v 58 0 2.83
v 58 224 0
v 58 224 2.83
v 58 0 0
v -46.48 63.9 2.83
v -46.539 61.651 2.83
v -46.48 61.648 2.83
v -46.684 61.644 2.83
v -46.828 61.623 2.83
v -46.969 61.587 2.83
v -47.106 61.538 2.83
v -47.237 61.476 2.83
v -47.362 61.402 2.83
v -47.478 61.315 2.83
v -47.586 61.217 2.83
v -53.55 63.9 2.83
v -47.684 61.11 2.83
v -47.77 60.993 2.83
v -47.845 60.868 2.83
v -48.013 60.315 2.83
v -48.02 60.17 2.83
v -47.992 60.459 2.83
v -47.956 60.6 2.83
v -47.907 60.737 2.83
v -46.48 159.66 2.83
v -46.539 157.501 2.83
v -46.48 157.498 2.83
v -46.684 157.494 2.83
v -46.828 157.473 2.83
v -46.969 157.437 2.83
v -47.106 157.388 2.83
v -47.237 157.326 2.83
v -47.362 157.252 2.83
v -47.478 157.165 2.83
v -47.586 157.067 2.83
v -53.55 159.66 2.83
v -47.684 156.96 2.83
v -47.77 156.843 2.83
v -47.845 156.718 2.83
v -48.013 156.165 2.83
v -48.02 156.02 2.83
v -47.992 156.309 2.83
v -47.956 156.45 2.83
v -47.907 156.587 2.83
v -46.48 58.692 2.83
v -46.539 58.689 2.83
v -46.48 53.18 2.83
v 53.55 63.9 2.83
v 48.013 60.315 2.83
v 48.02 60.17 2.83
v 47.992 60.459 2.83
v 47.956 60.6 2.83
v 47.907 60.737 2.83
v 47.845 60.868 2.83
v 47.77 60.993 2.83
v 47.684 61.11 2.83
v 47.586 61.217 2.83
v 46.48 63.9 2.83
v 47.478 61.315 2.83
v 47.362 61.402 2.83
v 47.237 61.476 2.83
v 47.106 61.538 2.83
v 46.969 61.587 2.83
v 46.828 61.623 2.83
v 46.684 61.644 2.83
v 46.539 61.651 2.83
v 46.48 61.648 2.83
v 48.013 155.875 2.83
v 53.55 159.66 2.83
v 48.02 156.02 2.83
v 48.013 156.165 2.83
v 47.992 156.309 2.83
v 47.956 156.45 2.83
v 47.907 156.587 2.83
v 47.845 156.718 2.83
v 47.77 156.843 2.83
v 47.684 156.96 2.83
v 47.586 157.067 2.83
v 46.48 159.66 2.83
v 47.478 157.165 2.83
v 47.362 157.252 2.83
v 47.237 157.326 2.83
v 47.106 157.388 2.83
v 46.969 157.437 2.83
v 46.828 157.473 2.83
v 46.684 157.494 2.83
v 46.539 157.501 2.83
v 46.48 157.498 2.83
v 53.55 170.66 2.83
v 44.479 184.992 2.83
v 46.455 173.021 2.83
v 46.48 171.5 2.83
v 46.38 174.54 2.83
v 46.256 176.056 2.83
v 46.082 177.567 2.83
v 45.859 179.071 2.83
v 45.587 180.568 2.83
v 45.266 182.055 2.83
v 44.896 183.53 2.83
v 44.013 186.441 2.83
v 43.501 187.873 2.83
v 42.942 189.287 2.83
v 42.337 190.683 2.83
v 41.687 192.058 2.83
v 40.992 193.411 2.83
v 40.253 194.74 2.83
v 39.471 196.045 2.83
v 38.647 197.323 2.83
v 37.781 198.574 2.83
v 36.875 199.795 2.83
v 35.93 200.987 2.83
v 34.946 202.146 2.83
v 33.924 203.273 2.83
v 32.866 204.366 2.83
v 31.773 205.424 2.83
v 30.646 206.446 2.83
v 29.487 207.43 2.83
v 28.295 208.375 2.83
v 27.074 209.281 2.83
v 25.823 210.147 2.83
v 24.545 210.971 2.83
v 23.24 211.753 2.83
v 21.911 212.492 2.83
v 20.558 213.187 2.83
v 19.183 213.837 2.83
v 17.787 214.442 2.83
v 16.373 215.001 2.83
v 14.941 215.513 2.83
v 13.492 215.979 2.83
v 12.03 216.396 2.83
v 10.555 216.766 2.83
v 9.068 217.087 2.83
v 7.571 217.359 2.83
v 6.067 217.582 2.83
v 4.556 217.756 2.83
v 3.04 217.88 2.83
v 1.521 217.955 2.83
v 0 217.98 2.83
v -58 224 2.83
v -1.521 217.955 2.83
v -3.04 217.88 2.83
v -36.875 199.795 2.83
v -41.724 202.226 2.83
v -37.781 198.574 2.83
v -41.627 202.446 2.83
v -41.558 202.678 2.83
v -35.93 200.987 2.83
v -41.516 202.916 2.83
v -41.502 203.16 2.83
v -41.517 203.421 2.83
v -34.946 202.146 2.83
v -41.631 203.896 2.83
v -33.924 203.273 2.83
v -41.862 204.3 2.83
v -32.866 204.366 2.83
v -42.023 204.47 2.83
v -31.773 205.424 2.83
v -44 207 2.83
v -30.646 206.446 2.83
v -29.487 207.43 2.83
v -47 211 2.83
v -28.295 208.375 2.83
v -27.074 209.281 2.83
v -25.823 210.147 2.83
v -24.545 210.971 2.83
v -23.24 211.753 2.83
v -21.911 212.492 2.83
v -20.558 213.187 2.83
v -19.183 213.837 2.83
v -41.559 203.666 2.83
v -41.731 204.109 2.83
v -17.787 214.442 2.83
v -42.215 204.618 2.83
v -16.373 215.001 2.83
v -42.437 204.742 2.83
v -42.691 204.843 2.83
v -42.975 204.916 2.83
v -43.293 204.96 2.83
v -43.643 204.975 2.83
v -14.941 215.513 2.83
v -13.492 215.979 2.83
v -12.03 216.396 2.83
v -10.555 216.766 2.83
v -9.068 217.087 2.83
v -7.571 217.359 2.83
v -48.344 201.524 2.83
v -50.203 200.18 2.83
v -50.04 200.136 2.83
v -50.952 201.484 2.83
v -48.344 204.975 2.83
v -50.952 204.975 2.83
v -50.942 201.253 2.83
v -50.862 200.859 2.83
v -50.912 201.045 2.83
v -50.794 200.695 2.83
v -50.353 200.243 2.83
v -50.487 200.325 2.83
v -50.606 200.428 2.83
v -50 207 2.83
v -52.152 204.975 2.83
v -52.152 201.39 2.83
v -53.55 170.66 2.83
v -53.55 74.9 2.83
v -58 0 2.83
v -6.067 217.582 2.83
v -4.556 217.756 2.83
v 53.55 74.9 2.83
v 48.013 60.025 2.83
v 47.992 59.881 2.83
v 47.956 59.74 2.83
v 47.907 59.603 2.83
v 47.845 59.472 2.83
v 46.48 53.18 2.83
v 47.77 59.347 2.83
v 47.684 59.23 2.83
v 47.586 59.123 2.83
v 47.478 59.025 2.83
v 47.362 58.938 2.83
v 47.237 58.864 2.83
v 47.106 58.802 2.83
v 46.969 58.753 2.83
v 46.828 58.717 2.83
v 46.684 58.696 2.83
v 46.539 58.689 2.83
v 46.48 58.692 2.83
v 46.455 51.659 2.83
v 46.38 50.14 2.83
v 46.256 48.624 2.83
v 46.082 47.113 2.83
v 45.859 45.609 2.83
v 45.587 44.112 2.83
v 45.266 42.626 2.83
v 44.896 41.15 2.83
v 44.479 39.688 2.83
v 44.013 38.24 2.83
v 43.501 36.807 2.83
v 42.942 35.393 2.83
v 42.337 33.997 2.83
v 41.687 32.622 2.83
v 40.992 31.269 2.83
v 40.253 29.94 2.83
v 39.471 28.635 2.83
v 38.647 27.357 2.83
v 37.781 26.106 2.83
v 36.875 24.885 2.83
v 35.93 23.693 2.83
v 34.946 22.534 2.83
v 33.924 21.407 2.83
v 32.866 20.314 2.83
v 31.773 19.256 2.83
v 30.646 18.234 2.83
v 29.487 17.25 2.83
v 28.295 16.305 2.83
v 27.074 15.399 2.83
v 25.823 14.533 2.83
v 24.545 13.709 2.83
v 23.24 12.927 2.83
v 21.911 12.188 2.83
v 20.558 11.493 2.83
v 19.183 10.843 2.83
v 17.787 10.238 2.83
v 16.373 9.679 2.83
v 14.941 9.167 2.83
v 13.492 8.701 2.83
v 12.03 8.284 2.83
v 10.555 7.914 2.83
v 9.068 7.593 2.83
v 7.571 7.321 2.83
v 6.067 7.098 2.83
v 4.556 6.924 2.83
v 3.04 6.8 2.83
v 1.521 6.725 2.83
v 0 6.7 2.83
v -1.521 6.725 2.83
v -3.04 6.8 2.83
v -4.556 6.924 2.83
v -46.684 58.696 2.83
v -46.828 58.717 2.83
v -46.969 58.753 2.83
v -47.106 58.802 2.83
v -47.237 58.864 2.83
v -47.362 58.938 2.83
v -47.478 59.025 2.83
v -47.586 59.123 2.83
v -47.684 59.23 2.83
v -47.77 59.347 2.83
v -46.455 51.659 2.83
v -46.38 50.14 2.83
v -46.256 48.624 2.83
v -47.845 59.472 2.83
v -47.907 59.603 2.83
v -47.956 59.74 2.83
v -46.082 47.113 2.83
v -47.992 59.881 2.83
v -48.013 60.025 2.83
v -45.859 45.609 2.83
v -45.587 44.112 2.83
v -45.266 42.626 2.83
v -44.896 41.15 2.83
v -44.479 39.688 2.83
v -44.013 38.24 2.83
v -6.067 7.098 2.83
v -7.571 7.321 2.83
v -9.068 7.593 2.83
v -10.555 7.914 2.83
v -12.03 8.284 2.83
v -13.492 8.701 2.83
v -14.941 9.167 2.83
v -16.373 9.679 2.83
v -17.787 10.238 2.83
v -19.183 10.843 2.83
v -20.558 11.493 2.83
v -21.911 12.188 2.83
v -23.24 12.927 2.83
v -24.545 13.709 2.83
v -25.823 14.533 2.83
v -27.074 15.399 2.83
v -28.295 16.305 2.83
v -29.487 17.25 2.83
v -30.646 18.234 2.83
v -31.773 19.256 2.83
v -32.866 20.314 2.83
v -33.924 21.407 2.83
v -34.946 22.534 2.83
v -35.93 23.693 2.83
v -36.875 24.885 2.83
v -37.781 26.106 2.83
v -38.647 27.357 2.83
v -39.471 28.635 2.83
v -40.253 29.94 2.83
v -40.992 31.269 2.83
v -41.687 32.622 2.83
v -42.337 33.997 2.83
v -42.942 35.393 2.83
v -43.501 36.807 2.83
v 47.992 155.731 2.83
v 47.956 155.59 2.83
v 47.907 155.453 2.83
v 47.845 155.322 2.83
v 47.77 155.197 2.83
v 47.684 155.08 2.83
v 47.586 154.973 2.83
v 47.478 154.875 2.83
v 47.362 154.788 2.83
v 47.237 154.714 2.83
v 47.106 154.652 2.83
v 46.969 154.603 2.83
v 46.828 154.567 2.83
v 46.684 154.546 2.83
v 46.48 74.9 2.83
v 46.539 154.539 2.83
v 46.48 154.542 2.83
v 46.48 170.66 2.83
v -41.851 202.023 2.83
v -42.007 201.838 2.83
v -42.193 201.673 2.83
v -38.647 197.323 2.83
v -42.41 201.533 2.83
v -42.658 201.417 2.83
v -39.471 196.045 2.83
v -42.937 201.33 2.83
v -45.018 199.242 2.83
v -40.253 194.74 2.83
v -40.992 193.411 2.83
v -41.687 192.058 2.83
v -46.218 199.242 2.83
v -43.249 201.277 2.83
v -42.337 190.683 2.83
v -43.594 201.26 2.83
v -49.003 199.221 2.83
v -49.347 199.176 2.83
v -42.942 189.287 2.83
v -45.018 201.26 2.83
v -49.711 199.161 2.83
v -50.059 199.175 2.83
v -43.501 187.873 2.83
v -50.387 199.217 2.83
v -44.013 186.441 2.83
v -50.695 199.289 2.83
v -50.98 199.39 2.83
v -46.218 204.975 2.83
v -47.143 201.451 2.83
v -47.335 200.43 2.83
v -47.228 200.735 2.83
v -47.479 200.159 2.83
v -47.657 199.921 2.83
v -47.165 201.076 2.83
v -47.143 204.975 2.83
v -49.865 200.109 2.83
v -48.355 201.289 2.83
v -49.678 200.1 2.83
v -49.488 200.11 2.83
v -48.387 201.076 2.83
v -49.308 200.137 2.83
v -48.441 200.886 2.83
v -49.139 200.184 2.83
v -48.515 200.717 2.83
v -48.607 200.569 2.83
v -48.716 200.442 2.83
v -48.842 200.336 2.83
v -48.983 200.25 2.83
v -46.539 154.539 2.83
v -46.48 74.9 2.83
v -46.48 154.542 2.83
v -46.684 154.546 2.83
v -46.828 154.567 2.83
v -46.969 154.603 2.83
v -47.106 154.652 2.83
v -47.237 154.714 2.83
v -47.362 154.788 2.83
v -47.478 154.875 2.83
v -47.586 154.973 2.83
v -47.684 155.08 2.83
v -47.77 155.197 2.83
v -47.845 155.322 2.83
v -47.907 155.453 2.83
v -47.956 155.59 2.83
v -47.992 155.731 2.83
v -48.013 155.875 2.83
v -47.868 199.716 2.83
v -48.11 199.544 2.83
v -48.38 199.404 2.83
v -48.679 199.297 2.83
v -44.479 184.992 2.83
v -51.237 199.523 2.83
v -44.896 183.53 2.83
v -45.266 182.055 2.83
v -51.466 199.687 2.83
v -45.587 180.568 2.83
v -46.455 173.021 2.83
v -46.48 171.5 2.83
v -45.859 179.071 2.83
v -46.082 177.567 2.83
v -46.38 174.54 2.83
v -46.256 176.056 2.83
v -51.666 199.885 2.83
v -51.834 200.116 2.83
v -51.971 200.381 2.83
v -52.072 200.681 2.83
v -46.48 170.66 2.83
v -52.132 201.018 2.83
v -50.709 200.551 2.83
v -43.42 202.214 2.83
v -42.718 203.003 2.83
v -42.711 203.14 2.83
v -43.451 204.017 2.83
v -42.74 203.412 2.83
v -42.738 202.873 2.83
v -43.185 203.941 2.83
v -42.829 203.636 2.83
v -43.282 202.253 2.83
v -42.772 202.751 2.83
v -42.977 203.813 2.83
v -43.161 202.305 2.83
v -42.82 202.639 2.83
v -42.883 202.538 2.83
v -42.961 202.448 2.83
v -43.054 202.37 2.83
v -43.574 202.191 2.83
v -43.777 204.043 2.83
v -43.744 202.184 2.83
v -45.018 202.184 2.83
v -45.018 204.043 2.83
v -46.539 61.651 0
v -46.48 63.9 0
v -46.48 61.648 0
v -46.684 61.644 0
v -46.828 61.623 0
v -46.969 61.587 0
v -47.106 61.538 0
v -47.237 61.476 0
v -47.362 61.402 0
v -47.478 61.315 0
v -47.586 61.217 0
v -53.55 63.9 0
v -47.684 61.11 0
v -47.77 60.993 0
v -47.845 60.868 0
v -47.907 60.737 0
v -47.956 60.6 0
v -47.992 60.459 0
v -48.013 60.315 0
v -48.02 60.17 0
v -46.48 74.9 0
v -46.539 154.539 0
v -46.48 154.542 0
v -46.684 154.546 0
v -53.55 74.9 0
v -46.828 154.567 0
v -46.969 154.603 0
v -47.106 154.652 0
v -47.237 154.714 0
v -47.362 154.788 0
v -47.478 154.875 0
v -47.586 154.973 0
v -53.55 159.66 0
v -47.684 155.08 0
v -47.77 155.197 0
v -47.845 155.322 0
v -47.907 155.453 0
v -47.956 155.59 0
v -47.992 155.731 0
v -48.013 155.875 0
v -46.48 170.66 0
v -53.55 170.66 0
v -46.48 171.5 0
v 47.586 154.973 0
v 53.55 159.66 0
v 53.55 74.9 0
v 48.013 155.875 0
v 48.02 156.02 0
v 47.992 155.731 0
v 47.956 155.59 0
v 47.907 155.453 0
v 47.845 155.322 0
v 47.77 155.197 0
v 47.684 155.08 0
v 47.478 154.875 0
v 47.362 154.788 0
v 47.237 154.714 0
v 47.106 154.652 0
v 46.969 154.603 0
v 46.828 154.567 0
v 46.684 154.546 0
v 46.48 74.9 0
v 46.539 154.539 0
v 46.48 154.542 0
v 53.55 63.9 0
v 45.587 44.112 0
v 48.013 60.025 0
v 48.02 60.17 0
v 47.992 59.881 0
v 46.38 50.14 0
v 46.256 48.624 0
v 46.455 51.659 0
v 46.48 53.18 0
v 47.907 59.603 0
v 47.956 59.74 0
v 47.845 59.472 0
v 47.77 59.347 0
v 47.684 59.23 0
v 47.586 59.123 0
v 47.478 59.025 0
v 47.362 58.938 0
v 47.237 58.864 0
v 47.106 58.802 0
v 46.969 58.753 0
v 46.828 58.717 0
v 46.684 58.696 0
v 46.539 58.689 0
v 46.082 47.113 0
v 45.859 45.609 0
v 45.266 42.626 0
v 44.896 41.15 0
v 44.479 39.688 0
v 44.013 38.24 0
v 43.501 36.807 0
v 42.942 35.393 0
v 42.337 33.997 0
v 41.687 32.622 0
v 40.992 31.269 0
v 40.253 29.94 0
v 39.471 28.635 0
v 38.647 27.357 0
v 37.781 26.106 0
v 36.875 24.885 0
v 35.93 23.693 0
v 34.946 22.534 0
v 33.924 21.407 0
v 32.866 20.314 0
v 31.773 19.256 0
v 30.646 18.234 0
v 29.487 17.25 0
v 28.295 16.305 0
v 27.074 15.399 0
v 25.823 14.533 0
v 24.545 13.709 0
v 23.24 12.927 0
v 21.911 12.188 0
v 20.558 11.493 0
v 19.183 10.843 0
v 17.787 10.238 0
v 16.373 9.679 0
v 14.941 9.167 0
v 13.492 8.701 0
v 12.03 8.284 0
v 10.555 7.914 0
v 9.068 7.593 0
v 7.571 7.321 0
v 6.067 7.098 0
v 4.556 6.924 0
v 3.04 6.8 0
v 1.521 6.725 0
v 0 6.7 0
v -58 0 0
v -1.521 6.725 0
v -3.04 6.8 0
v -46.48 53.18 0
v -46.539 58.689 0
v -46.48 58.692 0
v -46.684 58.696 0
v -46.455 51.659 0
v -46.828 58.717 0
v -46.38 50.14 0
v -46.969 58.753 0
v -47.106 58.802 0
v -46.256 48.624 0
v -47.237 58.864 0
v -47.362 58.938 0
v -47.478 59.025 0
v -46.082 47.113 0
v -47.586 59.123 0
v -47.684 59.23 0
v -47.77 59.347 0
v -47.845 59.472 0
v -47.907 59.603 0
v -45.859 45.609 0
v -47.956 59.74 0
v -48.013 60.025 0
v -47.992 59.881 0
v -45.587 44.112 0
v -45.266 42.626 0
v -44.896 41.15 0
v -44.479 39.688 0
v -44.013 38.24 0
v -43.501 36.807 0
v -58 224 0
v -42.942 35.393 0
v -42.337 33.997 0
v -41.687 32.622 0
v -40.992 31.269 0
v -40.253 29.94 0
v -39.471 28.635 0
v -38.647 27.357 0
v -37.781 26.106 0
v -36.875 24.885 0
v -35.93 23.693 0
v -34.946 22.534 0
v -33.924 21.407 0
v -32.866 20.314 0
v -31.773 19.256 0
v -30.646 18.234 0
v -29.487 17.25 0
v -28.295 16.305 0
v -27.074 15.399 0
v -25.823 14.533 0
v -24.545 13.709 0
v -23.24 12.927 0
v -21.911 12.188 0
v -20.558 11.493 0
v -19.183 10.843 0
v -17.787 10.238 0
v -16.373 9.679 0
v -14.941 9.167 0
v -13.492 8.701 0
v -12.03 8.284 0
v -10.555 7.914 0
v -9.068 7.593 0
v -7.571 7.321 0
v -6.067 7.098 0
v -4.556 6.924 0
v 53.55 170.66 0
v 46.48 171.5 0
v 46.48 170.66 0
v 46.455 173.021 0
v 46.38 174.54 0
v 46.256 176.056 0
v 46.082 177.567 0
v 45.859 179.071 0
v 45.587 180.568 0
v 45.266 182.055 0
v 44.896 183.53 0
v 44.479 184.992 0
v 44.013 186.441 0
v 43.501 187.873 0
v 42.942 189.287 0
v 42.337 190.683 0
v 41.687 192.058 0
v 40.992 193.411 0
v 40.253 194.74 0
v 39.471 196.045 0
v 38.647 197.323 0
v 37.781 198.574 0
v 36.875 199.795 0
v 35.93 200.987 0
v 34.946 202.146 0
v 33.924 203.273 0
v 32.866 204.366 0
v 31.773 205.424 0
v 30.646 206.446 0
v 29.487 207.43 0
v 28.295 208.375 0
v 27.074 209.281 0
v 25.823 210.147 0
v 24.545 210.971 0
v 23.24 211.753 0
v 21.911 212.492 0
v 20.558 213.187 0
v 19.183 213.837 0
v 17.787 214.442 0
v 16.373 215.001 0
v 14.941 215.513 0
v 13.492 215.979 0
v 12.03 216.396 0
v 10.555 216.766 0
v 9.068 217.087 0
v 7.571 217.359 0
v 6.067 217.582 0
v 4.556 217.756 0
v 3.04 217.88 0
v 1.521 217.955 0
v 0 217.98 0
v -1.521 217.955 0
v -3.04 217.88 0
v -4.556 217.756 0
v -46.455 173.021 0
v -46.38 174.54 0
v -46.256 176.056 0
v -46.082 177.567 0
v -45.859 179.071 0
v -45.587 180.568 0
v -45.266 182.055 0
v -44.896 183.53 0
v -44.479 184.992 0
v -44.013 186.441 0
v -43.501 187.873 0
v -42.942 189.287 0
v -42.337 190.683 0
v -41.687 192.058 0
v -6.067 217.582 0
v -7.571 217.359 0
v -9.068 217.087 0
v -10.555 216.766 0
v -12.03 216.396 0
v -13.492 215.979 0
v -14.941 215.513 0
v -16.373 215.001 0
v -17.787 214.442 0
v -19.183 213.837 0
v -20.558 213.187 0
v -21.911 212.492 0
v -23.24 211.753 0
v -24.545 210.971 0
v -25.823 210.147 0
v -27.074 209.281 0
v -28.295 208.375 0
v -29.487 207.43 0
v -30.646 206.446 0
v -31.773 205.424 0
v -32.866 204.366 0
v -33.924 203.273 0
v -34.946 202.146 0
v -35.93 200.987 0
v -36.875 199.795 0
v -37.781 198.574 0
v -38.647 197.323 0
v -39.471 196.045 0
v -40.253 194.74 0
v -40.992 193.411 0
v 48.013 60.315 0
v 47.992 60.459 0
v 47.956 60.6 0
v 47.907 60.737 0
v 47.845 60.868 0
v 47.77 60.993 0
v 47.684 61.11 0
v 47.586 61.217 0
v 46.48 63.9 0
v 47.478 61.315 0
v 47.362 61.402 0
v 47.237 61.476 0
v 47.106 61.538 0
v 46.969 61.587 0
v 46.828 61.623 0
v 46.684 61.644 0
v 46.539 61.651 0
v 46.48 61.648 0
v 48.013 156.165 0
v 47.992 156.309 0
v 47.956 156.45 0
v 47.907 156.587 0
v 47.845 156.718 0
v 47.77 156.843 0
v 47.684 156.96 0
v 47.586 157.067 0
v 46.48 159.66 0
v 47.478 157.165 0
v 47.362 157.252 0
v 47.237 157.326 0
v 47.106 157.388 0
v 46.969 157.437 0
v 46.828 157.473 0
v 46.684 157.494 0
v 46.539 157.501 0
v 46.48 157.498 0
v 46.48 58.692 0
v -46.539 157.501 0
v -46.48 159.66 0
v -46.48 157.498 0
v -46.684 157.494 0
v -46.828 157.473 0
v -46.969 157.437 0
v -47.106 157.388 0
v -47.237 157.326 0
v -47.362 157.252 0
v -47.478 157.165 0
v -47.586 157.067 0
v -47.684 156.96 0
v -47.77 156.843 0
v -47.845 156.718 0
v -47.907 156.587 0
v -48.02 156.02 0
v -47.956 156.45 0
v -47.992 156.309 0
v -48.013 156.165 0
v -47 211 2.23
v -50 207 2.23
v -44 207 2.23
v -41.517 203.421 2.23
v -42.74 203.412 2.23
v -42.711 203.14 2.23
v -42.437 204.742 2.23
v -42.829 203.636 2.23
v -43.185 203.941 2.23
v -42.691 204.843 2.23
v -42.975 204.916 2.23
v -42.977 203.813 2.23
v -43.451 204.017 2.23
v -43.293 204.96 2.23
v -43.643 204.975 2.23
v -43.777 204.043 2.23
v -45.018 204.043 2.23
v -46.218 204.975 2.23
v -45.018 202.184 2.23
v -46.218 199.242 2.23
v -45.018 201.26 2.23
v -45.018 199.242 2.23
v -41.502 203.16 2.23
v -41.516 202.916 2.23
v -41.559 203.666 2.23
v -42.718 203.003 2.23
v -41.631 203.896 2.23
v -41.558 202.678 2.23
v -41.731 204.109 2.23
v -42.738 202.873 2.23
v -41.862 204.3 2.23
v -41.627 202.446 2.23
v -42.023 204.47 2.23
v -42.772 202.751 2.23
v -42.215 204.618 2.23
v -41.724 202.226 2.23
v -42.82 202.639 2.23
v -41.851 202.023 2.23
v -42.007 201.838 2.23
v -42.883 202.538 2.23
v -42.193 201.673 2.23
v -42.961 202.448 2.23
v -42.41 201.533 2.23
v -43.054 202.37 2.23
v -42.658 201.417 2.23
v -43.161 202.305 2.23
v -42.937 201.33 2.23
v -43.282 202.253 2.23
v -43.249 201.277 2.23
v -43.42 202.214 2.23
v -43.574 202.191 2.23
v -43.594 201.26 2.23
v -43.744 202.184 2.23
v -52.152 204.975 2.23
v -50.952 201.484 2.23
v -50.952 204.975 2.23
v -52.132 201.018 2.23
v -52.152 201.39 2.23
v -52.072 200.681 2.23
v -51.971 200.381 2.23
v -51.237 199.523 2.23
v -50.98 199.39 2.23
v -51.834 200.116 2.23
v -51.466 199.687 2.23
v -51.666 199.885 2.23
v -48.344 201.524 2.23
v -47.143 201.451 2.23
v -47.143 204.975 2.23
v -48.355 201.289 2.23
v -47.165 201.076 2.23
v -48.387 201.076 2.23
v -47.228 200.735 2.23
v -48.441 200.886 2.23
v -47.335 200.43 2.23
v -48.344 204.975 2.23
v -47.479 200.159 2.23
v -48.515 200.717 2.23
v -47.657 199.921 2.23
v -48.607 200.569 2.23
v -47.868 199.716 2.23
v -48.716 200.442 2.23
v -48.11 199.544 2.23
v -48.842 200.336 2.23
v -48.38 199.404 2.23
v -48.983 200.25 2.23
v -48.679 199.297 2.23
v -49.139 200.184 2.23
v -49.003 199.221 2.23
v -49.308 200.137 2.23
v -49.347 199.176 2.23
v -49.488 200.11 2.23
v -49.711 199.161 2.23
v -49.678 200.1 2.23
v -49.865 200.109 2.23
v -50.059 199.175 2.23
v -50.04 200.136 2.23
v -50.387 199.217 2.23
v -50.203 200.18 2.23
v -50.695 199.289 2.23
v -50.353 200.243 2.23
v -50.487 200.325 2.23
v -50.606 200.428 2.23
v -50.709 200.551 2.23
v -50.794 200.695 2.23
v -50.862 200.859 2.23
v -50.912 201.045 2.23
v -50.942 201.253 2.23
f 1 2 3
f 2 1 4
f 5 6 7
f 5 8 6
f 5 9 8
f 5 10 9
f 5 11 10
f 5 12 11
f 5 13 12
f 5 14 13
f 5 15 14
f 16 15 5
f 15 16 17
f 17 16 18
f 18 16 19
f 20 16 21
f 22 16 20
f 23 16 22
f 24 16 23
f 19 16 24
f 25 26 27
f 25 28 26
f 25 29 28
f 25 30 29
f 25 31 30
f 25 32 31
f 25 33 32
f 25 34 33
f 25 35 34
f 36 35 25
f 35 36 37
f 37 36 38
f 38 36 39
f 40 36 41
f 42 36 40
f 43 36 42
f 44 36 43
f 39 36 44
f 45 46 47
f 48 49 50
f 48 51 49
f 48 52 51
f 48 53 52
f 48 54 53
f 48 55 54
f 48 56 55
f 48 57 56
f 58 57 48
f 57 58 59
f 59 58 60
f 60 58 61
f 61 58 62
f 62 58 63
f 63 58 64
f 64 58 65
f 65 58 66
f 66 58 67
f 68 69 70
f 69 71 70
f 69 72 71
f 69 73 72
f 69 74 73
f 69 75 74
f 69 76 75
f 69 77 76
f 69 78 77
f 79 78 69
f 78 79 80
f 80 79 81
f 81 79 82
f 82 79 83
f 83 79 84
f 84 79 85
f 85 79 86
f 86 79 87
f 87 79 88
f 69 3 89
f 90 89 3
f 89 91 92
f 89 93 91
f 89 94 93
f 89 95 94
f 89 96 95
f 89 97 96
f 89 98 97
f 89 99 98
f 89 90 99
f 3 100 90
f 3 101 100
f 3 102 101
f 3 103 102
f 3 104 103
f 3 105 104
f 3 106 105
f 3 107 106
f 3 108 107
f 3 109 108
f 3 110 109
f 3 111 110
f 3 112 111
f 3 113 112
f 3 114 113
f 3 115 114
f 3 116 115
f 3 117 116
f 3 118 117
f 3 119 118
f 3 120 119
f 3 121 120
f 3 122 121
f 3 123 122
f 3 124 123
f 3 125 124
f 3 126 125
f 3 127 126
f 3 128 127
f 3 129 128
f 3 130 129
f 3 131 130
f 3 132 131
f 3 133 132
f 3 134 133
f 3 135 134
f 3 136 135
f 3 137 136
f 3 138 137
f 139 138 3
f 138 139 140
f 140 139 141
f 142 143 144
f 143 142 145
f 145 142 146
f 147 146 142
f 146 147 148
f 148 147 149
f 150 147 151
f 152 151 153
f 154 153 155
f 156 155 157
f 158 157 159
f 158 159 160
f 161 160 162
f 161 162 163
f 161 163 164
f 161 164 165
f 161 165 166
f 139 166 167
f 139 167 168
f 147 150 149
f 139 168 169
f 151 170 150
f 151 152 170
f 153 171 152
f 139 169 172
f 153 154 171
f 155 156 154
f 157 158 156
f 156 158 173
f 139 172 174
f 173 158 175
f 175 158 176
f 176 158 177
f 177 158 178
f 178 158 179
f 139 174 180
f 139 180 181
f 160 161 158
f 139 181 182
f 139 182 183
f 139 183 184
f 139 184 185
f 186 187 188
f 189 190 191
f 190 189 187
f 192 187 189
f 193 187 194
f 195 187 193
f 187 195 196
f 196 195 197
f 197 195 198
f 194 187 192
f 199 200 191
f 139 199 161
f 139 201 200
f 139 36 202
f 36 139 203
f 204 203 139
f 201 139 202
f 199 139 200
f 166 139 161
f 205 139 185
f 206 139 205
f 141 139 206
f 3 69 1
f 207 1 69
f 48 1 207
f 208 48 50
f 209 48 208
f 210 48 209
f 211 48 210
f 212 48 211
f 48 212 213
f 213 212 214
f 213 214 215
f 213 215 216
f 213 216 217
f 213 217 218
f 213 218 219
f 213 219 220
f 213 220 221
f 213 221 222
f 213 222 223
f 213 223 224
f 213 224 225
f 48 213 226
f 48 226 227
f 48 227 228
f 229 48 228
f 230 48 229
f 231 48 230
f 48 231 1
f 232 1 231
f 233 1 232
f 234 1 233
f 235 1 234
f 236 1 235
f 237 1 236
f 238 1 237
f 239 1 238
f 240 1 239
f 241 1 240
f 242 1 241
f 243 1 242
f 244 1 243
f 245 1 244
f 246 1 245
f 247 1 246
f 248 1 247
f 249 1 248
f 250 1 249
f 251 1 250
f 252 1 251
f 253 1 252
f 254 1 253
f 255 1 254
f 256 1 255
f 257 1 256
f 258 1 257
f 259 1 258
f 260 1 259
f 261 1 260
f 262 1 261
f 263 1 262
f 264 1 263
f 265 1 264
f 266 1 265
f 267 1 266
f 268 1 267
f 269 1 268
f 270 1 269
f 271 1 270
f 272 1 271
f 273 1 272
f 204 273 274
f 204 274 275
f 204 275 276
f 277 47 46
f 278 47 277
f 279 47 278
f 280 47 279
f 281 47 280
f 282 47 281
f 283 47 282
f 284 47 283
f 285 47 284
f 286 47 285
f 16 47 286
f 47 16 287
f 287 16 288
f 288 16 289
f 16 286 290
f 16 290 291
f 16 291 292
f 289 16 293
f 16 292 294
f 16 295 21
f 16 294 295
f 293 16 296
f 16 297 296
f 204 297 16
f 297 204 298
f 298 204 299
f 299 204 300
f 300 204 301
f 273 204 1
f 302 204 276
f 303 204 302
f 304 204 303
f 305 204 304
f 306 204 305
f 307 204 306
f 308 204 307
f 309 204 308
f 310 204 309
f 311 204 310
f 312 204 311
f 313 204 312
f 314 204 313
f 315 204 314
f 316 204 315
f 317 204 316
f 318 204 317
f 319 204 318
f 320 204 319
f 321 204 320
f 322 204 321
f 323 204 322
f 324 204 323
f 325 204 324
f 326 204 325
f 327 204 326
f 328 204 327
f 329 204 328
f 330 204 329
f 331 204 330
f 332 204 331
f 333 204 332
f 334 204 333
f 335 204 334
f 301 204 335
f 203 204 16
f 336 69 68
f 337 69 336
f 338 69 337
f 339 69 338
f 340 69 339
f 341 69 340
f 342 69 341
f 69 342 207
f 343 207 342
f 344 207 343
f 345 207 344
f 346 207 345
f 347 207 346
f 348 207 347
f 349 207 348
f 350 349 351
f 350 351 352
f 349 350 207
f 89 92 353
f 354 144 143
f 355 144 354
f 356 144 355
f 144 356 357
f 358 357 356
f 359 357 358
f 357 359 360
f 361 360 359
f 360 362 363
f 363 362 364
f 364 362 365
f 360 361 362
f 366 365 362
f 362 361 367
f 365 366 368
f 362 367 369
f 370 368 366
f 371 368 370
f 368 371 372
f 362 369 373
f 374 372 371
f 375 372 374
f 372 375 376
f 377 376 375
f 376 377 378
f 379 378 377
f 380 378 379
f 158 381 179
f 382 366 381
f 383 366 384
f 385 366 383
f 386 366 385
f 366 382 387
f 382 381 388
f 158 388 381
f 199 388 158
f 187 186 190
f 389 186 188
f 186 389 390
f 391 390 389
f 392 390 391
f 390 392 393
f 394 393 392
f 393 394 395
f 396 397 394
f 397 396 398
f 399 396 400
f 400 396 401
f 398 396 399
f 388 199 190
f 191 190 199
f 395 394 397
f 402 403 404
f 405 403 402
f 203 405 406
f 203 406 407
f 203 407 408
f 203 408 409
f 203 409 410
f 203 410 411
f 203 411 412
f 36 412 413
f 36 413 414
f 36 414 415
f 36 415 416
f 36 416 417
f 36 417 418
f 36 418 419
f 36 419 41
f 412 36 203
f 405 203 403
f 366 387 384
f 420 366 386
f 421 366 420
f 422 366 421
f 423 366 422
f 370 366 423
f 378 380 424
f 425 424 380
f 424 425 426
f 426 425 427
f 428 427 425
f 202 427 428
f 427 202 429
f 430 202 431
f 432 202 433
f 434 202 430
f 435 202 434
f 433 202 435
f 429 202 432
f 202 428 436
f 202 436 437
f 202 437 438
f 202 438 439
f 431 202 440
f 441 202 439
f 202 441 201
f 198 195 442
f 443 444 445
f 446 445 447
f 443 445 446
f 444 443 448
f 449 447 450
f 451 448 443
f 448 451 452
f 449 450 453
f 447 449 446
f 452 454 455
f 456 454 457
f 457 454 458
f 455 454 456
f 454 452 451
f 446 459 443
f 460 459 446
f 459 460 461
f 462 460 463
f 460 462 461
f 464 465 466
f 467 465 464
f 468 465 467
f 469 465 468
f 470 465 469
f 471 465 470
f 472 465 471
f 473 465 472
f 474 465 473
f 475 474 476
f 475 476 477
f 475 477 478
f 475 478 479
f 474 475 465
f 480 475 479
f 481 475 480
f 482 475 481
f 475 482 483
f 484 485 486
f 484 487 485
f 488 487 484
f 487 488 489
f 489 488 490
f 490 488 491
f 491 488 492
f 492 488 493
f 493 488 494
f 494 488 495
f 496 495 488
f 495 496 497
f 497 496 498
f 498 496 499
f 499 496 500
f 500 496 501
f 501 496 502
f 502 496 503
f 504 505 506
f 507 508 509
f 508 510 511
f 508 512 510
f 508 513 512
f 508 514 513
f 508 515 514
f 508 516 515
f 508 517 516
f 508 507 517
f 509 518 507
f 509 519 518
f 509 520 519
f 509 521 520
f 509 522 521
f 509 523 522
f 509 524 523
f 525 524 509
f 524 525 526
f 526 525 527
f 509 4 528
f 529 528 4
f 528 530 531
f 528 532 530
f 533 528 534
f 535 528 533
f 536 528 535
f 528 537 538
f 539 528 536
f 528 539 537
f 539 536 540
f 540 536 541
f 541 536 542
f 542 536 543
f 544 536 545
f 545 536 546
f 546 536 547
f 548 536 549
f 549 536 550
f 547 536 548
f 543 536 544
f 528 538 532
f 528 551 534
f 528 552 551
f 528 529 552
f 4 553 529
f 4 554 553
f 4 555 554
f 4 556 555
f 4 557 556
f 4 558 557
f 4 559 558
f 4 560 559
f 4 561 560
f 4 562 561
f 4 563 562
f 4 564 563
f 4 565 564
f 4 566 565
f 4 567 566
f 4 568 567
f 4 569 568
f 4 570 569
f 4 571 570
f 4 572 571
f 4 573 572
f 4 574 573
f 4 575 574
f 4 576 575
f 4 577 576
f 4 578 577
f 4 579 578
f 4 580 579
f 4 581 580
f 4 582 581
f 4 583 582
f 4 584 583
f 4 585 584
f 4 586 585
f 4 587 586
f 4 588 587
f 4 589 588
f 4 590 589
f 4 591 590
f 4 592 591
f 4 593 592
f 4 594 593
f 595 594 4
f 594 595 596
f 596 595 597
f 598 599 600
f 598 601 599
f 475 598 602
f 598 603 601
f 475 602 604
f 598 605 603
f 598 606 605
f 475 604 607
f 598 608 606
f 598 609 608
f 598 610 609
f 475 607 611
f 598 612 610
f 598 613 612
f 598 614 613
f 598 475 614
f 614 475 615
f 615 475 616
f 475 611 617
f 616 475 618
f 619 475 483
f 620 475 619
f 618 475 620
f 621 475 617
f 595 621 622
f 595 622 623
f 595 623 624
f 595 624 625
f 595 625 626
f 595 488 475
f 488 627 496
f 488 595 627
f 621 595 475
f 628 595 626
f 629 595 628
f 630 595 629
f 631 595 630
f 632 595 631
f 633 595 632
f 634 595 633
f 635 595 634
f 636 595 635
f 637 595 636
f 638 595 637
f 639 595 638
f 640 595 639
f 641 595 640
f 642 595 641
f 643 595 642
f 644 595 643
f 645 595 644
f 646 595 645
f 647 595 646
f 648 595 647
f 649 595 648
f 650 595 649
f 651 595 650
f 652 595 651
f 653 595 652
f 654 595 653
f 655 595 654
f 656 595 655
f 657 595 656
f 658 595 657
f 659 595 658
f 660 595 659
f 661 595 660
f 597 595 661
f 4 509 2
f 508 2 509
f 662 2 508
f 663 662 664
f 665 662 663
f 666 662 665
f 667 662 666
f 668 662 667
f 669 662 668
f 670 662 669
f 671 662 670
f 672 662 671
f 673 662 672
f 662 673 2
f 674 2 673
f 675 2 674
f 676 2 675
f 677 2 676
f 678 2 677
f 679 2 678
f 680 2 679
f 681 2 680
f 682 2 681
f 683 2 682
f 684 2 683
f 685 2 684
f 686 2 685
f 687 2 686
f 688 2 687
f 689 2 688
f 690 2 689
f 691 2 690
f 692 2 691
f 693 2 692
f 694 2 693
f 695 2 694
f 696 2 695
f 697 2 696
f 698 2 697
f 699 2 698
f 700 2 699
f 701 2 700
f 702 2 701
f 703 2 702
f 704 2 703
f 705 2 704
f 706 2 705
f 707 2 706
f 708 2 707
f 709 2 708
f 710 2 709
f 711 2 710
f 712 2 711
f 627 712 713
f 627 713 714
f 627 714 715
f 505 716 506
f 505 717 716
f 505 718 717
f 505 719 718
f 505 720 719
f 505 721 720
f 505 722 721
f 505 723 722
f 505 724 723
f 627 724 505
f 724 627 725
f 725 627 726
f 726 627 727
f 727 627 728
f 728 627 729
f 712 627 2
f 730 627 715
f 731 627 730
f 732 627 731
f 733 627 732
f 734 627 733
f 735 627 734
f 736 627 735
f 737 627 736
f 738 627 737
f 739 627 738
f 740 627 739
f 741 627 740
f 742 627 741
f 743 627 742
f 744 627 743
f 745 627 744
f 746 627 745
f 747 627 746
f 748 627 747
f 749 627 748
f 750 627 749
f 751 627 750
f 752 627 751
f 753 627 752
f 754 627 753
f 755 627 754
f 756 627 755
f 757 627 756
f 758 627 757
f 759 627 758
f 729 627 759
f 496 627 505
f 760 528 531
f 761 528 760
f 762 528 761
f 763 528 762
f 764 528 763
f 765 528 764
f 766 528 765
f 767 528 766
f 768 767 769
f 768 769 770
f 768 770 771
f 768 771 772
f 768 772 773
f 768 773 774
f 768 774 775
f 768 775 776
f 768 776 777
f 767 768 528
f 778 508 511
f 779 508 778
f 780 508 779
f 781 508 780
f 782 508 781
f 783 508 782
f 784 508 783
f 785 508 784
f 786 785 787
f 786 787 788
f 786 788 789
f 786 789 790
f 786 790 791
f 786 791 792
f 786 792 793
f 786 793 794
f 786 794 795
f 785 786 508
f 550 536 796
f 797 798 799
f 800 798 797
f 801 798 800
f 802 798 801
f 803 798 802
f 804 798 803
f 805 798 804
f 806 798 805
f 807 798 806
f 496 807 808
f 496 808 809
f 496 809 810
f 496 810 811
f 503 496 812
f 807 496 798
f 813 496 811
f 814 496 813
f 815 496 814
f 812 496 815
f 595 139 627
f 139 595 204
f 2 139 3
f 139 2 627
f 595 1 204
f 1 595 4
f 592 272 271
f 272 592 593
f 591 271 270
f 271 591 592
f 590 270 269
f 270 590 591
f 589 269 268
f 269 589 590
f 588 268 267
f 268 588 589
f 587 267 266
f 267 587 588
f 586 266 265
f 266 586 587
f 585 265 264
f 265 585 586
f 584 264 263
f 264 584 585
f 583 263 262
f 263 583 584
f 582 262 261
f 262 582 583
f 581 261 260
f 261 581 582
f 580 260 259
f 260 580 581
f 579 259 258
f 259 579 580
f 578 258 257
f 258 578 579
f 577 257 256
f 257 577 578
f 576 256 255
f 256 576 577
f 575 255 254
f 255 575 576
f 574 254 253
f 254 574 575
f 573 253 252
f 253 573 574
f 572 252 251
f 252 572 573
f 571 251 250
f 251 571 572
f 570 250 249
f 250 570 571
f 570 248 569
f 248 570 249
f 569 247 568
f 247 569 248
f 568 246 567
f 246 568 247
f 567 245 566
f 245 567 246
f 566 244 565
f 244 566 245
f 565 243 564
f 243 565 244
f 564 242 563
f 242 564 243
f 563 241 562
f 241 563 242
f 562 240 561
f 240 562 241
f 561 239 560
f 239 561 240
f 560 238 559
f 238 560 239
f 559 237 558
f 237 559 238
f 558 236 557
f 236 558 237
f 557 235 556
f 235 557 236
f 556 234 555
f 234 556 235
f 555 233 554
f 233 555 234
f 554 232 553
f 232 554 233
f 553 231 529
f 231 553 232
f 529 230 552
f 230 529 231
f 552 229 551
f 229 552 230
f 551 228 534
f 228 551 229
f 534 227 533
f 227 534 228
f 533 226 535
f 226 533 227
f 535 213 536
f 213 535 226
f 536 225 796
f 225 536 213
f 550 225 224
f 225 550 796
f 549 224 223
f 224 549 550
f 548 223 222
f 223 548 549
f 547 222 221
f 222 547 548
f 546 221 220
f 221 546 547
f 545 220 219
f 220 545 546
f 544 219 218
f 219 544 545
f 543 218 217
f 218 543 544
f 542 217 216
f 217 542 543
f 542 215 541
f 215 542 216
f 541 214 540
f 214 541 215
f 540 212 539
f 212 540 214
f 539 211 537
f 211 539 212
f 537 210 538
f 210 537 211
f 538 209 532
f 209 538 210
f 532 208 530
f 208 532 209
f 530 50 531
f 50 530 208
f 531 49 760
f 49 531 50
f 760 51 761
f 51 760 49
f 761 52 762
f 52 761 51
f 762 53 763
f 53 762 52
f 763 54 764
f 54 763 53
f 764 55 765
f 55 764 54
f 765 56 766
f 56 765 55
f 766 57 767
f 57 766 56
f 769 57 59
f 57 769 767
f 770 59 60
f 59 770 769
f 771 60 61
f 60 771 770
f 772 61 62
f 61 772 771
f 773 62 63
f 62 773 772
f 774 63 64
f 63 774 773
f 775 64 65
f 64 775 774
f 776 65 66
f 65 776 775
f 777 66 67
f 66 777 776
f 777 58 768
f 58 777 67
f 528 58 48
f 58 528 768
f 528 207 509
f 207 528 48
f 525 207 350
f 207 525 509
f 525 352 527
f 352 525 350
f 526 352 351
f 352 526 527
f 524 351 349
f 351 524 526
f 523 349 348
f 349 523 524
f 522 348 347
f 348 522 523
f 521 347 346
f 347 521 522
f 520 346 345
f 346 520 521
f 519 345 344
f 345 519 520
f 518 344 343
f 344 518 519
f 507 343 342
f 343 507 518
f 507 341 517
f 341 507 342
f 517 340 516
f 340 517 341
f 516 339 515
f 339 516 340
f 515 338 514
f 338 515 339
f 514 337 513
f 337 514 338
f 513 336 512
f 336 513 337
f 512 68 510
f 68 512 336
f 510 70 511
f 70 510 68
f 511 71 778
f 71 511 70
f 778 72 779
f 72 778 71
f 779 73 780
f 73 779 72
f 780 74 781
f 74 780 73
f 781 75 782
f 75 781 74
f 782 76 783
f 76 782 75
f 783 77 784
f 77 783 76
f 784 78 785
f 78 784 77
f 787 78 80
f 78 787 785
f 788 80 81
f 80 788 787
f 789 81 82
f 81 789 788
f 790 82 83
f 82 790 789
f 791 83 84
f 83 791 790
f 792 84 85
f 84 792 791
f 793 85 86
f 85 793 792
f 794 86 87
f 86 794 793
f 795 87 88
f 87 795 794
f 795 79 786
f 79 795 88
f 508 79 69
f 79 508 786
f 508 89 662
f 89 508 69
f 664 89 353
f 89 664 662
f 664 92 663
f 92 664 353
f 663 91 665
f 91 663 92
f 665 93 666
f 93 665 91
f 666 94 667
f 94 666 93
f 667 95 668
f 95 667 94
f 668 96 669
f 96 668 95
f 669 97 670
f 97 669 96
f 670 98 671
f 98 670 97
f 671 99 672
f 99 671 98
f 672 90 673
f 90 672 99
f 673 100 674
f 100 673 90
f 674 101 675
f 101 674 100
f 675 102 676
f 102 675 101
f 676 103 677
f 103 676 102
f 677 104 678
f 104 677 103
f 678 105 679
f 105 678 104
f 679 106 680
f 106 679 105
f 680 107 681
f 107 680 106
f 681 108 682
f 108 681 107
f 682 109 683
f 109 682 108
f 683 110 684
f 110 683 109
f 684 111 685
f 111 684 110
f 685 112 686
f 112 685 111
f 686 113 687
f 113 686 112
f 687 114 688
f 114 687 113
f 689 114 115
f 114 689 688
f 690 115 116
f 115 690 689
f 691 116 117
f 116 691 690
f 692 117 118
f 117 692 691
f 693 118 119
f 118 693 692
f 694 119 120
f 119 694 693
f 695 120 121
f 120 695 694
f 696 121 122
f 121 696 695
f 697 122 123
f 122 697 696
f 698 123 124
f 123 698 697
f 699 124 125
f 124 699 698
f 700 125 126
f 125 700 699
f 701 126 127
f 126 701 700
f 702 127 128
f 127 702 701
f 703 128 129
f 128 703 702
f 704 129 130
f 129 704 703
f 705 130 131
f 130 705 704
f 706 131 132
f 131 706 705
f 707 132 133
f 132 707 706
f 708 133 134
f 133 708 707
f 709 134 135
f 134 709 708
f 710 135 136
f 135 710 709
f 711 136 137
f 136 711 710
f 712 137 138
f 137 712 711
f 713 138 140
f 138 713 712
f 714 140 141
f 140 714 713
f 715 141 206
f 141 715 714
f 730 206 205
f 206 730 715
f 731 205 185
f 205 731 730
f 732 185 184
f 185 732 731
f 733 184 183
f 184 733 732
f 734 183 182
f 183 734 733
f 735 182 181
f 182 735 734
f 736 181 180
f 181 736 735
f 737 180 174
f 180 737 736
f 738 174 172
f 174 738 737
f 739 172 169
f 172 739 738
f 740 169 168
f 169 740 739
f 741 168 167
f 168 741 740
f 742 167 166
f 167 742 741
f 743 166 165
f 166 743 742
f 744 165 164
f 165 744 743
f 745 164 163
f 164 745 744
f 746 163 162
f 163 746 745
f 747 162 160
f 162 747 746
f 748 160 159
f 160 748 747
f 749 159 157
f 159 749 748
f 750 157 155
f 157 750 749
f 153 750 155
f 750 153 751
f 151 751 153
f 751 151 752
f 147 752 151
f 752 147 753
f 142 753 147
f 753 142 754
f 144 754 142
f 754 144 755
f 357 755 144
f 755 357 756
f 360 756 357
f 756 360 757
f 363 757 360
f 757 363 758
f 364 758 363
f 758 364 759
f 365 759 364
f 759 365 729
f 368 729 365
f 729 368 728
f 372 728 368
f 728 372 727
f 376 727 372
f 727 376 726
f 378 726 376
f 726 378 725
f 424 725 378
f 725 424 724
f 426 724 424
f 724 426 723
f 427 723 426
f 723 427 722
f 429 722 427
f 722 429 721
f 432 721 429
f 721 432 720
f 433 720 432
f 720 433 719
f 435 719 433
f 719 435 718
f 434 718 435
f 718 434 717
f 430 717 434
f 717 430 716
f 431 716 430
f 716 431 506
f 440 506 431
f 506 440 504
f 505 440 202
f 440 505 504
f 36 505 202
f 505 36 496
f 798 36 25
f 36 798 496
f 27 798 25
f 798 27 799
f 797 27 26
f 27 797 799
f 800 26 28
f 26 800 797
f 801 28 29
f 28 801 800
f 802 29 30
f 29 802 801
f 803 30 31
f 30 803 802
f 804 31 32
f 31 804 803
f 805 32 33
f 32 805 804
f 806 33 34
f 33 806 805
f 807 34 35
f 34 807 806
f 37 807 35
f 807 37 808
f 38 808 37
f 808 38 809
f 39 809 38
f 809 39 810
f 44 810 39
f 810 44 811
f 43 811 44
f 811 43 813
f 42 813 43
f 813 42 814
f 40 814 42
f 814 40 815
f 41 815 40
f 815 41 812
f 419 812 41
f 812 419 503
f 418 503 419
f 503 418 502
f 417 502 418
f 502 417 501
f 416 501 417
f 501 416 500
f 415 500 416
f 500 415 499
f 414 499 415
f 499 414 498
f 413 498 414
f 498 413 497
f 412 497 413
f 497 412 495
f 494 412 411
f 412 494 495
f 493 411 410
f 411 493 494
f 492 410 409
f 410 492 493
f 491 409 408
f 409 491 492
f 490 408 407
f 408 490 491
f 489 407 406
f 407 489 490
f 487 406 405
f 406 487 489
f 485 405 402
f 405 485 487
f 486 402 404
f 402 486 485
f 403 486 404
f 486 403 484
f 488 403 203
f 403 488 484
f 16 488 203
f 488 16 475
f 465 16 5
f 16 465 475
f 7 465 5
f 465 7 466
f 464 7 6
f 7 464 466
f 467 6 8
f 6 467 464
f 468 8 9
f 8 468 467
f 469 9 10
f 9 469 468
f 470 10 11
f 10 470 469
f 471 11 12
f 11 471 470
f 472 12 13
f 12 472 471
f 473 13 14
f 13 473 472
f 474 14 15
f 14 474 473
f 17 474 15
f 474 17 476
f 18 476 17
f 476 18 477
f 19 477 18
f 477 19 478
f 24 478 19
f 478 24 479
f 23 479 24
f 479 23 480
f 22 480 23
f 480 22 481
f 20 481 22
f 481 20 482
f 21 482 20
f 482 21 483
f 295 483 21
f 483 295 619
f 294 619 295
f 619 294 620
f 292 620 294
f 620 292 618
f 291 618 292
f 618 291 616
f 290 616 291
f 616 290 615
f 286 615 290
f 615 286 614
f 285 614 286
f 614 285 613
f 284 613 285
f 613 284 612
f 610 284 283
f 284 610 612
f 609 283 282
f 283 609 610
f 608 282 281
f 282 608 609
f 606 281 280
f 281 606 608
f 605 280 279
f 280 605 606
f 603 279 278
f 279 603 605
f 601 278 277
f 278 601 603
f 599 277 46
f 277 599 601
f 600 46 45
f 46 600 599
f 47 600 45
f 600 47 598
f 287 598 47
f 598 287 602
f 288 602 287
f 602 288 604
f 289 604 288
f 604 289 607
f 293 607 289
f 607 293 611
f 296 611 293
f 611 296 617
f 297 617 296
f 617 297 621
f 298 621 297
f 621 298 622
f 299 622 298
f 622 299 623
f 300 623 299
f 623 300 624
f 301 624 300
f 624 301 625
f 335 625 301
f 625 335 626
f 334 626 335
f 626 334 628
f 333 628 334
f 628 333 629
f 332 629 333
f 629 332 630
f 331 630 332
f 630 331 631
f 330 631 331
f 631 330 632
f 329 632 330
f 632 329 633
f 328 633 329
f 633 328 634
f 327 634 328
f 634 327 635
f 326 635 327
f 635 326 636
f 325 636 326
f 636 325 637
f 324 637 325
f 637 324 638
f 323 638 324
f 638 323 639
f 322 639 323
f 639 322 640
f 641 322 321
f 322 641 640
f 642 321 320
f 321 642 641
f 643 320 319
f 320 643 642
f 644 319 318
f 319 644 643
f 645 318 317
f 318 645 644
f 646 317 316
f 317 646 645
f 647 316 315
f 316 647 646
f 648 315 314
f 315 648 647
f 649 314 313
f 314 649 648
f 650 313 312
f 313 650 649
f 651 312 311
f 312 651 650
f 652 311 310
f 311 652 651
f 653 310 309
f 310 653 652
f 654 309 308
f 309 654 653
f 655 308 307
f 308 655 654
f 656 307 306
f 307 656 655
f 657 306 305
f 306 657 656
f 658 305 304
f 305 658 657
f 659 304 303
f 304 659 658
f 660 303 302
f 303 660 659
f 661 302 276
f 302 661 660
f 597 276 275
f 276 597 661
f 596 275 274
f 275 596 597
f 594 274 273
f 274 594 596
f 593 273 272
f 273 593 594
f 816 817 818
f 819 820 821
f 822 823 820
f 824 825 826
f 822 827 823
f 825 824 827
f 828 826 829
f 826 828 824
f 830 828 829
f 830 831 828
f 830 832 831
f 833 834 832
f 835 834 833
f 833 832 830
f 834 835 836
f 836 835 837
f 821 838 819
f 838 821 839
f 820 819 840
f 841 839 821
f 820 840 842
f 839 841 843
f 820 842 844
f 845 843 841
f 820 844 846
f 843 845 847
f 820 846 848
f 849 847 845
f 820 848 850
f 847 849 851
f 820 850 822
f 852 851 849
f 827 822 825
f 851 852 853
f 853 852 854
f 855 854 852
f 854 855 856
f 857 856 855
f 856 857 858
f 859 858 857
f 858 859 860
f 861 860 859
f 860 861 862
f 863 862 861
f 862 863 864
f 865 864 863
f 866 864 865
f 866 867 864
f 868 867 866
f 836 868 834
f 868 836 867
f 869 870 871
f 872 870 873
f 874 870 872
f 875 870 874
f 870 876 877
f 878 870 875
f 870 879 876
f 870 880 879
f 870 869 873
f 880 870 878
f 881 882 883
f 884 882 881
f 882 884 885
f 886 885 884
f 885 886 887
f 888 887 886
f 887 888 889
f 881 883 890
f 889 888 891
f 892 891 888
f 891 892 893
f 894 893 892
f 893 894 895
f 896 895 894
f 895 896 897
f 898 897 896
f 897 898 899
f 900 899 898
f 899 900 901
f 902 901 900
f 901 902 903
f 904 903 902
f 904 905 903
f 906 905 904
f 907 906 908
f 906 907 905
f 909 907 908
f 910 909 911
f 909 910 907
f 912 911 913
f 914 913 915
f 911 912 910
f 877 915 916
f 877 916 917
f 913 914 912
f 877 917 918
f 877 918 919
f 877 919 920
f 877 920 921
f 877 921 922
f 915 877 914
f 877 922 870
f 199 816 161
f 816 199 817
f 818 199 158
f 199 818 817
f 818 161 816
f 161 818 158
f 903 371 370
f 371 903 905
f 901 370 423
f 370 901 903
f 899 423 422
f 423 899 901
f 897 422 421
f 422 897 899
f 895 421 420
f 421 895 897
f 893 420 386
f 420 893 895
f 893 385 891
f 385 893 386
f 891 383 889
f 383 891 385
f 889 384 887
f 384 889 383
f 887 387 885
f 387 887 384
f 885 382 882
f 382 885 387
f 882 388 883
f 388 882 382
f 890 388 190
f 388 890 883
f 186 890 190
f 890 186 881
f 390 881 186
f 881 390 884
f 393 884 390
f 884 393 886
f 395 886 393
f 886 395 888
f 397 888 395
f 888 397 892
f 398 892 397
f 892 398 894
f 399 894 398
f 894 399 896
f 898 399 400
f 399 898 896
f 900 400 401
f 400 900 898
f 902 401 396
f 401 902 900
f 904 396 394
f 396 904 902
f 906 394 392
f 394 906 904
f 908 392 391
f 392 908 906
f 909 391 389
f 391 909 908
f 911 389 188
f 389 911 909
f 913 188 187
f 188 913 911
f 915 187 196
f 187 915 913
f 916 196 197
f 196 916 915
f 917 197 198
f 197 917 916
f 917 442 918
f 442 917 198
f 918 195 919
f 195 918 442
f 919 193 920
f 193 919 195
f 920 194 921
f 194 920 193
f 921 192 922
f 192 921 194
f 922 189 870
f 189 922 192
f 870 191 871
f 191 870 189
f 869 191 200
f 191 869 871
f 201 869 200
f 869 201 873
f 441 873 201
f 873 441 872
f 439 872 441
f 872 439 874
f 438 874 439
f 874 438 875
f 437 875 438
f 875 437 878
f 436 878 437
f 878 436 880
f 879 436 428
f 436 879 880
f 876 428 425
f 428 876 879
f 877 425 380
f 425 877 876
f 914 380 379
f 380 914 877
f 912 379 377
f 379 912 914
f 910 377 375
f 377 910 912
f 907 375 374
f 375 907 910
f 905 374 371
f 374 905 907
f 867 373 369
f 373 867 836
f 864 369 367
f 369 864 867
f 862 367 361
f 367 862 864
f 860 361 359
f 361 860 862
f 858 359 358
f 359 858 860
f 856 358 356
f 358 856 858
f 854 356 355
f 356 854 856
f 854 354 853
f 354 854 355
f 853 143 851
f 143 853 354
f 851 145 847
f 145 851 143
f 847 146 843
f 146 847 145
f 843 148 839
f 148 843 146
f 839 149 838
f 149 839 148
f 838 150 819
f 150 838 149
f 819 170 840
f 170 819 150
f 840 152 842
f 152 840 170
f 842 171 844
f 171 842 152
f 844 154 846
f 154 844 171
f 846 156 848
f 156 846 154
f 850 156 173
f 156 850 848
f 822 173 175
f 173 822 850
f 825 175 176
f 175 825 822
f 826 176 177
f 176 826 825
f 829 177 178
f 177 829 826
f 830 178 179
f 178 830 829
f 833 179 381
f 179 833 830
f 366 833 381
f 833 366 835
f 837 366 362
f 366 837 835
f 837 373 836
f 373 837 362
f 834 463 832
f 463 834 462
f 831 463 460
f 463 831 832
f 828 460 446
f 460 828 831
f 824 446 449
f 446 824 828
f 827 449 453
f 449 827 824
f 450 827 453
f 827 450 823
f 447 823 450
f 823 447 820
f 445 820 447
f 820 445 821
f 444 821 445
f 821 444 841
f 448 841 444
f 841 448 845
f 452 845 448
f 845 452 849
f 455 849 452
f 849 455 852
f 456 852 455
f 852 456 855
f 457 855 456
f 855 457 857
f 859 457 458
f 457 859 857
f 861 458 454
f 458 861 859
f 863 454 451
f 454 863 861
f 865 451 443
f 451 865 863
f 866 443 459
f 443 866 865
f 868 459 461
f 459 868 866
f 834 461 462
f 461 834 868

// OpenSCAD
// =====================================================================
//  Air conditioner exhaust: the hose's hole, and a flat test plate
// =====================================================================
//  The hole in the air conditioner's own window panel, where the exhaust
//  hose's end clips in. Traced in pen on 1 mm paper, redrawn in Visio
//  just outside the pen line; the values below are the drawing's,
//  converted from points (1 pt = 25.4 / 72 mm). The drawing and the
//  scan stay out of the repository.
//
//  The hole is a slot with semicircular ends. On each long side it has
//  two rectangular notches (for the hose end's lugs) and, a little below
//  each one, a small round bump. It is not symmetric top to bottom: the
//  notches are nearer the top. "Top" is the drawing's top.
//
//  hole_test: a plate panel_t thick, the drawing's 116 x 224 rectangle,
//  with the hole in it. Its outline was checked on the original panel
//  (2 mm plate, 2026-11): it matches. At panel_t, the hose's end clips
//  into it.
//
//  ac_hole() is the hole alone, in 2D, for the AC box's panel
//  (insert_boxes.scad): x = 0 on its centre line, y = 0 on the plate's
//  top edge, downward negative (distances "below the top" below are
//  positive).
// =====================================================================

/* [Part to show or export] */
part = "hole_test";   // [hole_test]

/* [Hole (from the Visio drawing, mm)] */
hole_w   = 92.96;     // width: the semicircles' diameter
hole_top = 6.02;      // the hole's top, below the plate's top edge
hole_h   = 211.28;    // height, top of the upper arc to bottom of the lower one
notch_w  = 107.10;    // across both notches of a pair (7.07 past each side; the drawing has 7.05 and 7.11)
notches  = [[53.34, 11.0], [149.10, 11.0]];   // [top, below the plate's top edge; height]: upper and lower pair
bumps    = [67.98, 163.83];   // the round bumps' centres, below the plate's top edge (one pair under each notch)
bump     = [2.96, 1.54];      // a bump's length along the side and its depth past it (an arc through those points)

/* [Panel] */
panel_t  = 2.83;      // the panel's thickness at the hole: the hose's end clips onto this (measured on the hose)

/* [Test plate] */
plate_w  = 116;       // the drawing's rectangle
plate_h  = 224;
plate_tag = [6, 0.6]; // "UP": letter height, engraving depth

// the hole, 2D: x = 0 on its centre line, y = 0 on the plate's top edge, downward negative
module ac_hole() {
    r  = hole_w / 2;
    br = (pow(bump[0] / 2, 2) + pow(bump[1], 2)) / (2 * bump[1]);   // the bump's arc: its radius
    hull() for (y = [hole_top + r, hole_top + hole_h - r]) translate([0, -y]) circle(r, $fn = 192);
    for (n = notches) translate([-notch_w / 2, -(n[0] + n[1])]) square([notch_w, n[1]]);
    for (z = bumps, s = [-1, 1]) translate([s * (r + bump[1] - br), -z]) circle(br, $fn = 64);
}

// the test plate, flat on the bed, engraved face up; its top edge at y = plate_h
module hole_test() {
    difference() {
        translate([-plate_w / 2, 0, 0]) cube([plate_w, plate_h, panel_t]);
        translate([0, plate_h, -1]) linear_extrude(panel_t + 2) ac_hole();
        // "UP" and an arrow in the upper left corner, beside the upper arc
        translate([-plate_w / 2 + 11, plate_h - 22, panel_t - plate_tag[1]]) linear_extrude(1) {
            text("UP", size = plate_tag[0], font = "Liberation Sans:style=Bold", halign = "center", valign = "center");
            translate([0, plate_tag[0] / 2 + 2]) polygon([[-3, 0], [3, 0], [0, 4]]);
        }
    }
}

if (part == "hole_test") hole_test();

if (part == "hole_test") echo(hole_w = hole_w, hole_h = hole_h, notch_w = notch_w, straight_sides = hole_h - hole_w,
     hole_bottom_margin = plate_h - hole_top - hole_h);
